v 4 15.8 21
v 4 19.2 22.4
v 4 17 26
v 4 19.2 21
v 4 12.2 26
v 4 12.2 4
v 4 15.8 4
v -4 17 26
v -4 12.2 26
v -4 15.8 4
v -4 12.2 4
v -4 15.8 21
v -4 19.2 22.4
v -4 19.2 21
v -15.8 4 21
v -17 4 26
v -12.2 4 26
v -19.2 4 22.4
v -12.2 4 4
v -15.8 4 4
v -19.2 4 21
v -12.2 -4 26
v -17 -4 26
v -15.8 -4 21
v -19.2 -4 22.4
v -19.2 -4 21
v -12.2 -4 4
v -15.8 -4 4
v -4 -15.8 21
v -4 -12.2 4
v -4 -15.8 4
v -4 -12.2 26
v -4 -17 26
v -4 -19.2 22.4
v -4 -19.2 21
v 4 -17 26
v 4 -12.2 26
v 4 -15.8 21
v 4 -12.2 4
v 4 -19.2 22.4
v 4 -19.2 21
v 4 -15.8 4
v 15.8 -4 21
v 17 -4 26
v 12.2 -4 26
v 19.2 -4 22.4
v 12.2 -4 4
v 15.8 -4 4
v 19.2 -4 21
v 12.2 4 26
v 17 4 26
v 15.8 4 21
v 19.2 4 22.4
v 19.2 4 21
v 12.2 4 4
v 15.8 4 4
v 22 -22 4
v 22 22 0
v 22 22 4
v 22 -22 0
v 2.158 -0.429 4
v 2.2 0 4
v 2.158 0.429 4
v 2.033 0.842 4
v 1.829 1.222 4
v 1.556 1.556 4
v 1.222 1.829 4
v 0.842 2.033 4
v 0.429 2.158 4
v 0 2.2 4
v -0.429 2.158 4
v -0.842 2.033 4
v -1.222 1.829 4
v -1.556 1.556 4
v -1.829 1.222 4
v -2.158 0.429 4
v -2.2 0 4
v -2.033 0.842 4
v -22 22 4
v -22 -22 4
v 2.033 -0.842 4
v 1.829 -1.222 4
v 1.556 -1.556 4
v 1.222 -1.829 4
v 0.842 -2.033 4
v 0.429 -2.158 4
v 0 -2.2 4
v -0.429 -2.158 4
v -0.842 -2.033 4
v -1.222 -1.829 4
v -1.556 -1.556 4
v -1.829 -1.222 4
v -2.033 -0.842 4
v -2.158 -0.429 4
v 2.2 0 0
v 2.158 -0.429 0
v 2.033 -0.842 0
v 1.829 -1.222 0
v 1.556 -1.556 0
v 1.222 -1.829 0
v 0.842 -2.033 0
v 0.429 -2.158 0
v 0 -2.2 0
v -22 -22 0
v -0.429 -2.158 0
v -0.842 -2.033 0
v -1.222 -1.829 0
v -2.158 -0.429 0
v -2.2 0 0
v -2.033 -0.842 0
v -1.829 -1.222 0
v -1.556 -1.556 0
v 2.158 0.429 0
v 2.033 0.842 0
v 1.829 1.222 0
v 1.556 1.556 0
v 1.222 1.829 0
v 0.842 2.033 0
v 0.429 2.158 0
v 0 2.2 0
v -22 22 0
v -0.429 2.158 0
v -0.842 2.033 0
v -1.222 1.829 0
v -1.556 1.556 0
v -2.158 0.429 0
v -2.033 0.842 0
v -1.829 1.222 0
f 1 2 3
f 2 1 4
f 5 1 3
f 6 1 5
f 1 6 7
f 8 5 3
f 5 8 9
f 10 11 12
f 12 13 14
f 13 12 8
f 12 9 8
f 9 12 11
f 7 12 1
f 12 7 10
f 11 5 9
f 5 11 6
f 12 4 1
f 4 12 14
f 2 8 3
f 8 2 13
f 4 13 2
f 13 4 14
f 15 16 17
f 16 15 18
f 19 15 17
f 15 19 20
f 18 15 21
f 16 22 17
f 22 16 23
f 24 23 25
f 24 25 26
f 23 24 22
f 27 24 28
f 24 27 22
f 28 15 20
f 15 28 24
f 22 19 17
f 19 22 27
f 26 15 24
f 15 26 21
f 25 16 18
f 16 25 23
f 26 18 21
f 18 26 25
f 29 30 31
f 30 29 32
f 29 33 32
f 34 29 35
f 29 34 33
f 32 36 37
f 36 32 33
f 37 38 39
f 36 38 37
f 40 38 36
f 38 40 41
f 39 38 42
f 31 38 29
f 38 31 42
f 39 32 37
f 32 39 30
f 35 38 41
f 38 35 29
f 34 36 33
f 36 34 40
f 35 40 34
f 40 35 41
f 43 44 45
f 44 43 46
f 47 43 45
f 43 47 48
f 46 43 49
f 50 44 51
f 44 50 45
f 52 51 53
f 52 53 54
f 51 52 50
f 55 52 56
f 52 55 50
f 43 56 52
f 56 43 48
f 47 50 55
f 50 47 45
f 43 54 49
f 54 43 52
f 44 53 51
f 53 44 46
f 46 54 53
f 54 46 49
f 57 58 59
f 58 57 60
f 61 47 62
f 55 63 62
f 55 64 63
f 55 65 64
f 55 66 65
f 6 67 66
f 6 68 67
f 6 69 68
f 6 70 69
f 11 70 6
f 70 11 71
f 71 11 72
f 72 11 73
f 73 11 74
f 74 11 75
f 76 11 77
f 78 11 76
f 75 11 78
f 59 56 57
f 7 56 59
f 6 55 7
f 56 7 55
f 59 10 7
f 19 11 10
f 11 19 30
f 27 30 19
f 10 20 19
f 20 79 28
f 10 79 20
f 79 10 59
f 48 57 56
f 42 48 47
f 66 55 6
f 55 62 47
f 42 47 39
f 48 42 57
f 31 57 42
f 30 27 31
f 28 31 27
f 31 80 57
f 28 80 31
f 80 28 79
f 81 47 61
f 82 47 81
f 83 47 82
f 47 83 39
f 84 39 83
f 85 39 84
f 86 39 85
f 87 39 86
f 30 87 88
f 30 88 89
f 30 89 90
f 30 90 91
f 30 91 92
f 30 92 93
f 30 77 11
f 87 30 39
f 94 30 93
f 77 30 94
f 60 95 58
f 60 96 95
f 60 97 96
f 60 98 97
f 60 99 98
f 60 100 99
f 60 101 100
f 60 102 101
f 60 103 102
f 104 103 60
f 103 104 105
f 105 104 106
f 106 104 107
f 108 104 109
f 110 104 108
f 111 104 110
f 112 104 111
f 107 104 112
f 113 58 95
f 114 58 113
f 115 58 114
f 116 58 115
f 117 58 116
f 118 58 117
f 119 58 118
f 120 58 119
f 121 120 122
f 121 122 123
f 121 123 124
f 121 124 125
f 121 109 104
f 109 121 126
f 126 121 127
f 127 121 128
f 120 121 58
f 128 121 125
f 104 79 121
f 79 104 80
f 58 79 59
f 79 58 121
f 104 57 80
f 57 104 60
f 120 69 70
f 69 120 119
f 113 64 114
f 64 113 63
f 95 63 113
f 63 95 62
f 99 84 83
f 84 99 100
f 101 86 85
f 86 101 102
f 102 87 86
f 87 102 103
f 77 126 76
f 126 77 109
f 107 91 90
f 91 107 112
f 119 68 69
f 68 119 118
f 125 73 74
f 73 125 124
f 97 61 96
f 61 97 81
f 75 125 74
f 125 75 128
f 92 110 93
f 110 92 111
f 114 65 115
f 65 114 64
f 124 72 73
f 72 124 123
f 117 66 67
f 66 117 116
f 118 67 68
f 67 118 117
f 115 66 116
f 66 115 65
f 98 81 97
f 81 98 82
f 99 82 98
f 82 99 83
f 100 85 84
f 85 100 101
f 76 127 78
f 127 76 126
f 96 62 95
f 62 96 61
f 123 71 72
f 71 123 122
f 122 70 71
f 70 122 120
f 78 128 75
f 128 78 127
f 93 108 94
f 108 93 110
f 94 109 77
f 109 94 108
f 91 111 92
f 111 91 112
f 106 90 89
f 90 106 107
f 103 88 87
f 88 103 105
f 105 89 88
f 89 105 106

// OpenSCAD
$fn = 32;

// ----------------------------------------------------------------------
// Snap-fit latch: 4 arms, 22 mm tall, 3.6 mm undercut hooks
// ----------------------------------------------------------------------

// --- parameters (mm) ---
base_d = 44;              // base plate depth
base_h = 4;               // base plate thickness
span = 28;                // distance between opposite arms
arm_t = 3.6;              // arm thickness
arm_d = 8;                // arm width
height = 22;              // free arm length
head_len = 3.6;           // hook reach
head_h = 5;               // hook height
lead = 1.4;               // lead-in ramp thickness
bore_d = 4.4;             // base fixing bore
top_z = 26;               // height of the arm tips above the base

arms = 4;

difference() {
  union() {
    /* base plate, centred on the arm ring */
    translate([-22, -22, 0]) cube([base_d, base_d, base_h]);
    for (a = [0 : 360 / arms : 359]) rotate([0, 0, a]) {
    /* arm, sunk 0.5 mm into the base */
    translate([-arm_d / 2, span / 2 - arm_t / 2, base_h - 0.5]) cube([arm_d, arm_t, height + 0.5]);
    /* hook: a convex hull of a tall inner block and a thin outer lip
       gives a flat undercut below and a lead-in ramp on top */
    hull() {
      translate([-arm_d / 2, span / 2 + arm_t / 2 - 0.6, top_z - head_h]) cube([arm_d, lead + 0.4, head_h]);
      translate([-arm_d / 2, span / 2 + arm_t / 2 - 0.2, top_z - head_h]) cube([arm_d, head_len, lead]);
    }
    }
  }
  translate([0, 0, -2.5]) cylinder(h = base_h + 5, d = bore_d);
}
